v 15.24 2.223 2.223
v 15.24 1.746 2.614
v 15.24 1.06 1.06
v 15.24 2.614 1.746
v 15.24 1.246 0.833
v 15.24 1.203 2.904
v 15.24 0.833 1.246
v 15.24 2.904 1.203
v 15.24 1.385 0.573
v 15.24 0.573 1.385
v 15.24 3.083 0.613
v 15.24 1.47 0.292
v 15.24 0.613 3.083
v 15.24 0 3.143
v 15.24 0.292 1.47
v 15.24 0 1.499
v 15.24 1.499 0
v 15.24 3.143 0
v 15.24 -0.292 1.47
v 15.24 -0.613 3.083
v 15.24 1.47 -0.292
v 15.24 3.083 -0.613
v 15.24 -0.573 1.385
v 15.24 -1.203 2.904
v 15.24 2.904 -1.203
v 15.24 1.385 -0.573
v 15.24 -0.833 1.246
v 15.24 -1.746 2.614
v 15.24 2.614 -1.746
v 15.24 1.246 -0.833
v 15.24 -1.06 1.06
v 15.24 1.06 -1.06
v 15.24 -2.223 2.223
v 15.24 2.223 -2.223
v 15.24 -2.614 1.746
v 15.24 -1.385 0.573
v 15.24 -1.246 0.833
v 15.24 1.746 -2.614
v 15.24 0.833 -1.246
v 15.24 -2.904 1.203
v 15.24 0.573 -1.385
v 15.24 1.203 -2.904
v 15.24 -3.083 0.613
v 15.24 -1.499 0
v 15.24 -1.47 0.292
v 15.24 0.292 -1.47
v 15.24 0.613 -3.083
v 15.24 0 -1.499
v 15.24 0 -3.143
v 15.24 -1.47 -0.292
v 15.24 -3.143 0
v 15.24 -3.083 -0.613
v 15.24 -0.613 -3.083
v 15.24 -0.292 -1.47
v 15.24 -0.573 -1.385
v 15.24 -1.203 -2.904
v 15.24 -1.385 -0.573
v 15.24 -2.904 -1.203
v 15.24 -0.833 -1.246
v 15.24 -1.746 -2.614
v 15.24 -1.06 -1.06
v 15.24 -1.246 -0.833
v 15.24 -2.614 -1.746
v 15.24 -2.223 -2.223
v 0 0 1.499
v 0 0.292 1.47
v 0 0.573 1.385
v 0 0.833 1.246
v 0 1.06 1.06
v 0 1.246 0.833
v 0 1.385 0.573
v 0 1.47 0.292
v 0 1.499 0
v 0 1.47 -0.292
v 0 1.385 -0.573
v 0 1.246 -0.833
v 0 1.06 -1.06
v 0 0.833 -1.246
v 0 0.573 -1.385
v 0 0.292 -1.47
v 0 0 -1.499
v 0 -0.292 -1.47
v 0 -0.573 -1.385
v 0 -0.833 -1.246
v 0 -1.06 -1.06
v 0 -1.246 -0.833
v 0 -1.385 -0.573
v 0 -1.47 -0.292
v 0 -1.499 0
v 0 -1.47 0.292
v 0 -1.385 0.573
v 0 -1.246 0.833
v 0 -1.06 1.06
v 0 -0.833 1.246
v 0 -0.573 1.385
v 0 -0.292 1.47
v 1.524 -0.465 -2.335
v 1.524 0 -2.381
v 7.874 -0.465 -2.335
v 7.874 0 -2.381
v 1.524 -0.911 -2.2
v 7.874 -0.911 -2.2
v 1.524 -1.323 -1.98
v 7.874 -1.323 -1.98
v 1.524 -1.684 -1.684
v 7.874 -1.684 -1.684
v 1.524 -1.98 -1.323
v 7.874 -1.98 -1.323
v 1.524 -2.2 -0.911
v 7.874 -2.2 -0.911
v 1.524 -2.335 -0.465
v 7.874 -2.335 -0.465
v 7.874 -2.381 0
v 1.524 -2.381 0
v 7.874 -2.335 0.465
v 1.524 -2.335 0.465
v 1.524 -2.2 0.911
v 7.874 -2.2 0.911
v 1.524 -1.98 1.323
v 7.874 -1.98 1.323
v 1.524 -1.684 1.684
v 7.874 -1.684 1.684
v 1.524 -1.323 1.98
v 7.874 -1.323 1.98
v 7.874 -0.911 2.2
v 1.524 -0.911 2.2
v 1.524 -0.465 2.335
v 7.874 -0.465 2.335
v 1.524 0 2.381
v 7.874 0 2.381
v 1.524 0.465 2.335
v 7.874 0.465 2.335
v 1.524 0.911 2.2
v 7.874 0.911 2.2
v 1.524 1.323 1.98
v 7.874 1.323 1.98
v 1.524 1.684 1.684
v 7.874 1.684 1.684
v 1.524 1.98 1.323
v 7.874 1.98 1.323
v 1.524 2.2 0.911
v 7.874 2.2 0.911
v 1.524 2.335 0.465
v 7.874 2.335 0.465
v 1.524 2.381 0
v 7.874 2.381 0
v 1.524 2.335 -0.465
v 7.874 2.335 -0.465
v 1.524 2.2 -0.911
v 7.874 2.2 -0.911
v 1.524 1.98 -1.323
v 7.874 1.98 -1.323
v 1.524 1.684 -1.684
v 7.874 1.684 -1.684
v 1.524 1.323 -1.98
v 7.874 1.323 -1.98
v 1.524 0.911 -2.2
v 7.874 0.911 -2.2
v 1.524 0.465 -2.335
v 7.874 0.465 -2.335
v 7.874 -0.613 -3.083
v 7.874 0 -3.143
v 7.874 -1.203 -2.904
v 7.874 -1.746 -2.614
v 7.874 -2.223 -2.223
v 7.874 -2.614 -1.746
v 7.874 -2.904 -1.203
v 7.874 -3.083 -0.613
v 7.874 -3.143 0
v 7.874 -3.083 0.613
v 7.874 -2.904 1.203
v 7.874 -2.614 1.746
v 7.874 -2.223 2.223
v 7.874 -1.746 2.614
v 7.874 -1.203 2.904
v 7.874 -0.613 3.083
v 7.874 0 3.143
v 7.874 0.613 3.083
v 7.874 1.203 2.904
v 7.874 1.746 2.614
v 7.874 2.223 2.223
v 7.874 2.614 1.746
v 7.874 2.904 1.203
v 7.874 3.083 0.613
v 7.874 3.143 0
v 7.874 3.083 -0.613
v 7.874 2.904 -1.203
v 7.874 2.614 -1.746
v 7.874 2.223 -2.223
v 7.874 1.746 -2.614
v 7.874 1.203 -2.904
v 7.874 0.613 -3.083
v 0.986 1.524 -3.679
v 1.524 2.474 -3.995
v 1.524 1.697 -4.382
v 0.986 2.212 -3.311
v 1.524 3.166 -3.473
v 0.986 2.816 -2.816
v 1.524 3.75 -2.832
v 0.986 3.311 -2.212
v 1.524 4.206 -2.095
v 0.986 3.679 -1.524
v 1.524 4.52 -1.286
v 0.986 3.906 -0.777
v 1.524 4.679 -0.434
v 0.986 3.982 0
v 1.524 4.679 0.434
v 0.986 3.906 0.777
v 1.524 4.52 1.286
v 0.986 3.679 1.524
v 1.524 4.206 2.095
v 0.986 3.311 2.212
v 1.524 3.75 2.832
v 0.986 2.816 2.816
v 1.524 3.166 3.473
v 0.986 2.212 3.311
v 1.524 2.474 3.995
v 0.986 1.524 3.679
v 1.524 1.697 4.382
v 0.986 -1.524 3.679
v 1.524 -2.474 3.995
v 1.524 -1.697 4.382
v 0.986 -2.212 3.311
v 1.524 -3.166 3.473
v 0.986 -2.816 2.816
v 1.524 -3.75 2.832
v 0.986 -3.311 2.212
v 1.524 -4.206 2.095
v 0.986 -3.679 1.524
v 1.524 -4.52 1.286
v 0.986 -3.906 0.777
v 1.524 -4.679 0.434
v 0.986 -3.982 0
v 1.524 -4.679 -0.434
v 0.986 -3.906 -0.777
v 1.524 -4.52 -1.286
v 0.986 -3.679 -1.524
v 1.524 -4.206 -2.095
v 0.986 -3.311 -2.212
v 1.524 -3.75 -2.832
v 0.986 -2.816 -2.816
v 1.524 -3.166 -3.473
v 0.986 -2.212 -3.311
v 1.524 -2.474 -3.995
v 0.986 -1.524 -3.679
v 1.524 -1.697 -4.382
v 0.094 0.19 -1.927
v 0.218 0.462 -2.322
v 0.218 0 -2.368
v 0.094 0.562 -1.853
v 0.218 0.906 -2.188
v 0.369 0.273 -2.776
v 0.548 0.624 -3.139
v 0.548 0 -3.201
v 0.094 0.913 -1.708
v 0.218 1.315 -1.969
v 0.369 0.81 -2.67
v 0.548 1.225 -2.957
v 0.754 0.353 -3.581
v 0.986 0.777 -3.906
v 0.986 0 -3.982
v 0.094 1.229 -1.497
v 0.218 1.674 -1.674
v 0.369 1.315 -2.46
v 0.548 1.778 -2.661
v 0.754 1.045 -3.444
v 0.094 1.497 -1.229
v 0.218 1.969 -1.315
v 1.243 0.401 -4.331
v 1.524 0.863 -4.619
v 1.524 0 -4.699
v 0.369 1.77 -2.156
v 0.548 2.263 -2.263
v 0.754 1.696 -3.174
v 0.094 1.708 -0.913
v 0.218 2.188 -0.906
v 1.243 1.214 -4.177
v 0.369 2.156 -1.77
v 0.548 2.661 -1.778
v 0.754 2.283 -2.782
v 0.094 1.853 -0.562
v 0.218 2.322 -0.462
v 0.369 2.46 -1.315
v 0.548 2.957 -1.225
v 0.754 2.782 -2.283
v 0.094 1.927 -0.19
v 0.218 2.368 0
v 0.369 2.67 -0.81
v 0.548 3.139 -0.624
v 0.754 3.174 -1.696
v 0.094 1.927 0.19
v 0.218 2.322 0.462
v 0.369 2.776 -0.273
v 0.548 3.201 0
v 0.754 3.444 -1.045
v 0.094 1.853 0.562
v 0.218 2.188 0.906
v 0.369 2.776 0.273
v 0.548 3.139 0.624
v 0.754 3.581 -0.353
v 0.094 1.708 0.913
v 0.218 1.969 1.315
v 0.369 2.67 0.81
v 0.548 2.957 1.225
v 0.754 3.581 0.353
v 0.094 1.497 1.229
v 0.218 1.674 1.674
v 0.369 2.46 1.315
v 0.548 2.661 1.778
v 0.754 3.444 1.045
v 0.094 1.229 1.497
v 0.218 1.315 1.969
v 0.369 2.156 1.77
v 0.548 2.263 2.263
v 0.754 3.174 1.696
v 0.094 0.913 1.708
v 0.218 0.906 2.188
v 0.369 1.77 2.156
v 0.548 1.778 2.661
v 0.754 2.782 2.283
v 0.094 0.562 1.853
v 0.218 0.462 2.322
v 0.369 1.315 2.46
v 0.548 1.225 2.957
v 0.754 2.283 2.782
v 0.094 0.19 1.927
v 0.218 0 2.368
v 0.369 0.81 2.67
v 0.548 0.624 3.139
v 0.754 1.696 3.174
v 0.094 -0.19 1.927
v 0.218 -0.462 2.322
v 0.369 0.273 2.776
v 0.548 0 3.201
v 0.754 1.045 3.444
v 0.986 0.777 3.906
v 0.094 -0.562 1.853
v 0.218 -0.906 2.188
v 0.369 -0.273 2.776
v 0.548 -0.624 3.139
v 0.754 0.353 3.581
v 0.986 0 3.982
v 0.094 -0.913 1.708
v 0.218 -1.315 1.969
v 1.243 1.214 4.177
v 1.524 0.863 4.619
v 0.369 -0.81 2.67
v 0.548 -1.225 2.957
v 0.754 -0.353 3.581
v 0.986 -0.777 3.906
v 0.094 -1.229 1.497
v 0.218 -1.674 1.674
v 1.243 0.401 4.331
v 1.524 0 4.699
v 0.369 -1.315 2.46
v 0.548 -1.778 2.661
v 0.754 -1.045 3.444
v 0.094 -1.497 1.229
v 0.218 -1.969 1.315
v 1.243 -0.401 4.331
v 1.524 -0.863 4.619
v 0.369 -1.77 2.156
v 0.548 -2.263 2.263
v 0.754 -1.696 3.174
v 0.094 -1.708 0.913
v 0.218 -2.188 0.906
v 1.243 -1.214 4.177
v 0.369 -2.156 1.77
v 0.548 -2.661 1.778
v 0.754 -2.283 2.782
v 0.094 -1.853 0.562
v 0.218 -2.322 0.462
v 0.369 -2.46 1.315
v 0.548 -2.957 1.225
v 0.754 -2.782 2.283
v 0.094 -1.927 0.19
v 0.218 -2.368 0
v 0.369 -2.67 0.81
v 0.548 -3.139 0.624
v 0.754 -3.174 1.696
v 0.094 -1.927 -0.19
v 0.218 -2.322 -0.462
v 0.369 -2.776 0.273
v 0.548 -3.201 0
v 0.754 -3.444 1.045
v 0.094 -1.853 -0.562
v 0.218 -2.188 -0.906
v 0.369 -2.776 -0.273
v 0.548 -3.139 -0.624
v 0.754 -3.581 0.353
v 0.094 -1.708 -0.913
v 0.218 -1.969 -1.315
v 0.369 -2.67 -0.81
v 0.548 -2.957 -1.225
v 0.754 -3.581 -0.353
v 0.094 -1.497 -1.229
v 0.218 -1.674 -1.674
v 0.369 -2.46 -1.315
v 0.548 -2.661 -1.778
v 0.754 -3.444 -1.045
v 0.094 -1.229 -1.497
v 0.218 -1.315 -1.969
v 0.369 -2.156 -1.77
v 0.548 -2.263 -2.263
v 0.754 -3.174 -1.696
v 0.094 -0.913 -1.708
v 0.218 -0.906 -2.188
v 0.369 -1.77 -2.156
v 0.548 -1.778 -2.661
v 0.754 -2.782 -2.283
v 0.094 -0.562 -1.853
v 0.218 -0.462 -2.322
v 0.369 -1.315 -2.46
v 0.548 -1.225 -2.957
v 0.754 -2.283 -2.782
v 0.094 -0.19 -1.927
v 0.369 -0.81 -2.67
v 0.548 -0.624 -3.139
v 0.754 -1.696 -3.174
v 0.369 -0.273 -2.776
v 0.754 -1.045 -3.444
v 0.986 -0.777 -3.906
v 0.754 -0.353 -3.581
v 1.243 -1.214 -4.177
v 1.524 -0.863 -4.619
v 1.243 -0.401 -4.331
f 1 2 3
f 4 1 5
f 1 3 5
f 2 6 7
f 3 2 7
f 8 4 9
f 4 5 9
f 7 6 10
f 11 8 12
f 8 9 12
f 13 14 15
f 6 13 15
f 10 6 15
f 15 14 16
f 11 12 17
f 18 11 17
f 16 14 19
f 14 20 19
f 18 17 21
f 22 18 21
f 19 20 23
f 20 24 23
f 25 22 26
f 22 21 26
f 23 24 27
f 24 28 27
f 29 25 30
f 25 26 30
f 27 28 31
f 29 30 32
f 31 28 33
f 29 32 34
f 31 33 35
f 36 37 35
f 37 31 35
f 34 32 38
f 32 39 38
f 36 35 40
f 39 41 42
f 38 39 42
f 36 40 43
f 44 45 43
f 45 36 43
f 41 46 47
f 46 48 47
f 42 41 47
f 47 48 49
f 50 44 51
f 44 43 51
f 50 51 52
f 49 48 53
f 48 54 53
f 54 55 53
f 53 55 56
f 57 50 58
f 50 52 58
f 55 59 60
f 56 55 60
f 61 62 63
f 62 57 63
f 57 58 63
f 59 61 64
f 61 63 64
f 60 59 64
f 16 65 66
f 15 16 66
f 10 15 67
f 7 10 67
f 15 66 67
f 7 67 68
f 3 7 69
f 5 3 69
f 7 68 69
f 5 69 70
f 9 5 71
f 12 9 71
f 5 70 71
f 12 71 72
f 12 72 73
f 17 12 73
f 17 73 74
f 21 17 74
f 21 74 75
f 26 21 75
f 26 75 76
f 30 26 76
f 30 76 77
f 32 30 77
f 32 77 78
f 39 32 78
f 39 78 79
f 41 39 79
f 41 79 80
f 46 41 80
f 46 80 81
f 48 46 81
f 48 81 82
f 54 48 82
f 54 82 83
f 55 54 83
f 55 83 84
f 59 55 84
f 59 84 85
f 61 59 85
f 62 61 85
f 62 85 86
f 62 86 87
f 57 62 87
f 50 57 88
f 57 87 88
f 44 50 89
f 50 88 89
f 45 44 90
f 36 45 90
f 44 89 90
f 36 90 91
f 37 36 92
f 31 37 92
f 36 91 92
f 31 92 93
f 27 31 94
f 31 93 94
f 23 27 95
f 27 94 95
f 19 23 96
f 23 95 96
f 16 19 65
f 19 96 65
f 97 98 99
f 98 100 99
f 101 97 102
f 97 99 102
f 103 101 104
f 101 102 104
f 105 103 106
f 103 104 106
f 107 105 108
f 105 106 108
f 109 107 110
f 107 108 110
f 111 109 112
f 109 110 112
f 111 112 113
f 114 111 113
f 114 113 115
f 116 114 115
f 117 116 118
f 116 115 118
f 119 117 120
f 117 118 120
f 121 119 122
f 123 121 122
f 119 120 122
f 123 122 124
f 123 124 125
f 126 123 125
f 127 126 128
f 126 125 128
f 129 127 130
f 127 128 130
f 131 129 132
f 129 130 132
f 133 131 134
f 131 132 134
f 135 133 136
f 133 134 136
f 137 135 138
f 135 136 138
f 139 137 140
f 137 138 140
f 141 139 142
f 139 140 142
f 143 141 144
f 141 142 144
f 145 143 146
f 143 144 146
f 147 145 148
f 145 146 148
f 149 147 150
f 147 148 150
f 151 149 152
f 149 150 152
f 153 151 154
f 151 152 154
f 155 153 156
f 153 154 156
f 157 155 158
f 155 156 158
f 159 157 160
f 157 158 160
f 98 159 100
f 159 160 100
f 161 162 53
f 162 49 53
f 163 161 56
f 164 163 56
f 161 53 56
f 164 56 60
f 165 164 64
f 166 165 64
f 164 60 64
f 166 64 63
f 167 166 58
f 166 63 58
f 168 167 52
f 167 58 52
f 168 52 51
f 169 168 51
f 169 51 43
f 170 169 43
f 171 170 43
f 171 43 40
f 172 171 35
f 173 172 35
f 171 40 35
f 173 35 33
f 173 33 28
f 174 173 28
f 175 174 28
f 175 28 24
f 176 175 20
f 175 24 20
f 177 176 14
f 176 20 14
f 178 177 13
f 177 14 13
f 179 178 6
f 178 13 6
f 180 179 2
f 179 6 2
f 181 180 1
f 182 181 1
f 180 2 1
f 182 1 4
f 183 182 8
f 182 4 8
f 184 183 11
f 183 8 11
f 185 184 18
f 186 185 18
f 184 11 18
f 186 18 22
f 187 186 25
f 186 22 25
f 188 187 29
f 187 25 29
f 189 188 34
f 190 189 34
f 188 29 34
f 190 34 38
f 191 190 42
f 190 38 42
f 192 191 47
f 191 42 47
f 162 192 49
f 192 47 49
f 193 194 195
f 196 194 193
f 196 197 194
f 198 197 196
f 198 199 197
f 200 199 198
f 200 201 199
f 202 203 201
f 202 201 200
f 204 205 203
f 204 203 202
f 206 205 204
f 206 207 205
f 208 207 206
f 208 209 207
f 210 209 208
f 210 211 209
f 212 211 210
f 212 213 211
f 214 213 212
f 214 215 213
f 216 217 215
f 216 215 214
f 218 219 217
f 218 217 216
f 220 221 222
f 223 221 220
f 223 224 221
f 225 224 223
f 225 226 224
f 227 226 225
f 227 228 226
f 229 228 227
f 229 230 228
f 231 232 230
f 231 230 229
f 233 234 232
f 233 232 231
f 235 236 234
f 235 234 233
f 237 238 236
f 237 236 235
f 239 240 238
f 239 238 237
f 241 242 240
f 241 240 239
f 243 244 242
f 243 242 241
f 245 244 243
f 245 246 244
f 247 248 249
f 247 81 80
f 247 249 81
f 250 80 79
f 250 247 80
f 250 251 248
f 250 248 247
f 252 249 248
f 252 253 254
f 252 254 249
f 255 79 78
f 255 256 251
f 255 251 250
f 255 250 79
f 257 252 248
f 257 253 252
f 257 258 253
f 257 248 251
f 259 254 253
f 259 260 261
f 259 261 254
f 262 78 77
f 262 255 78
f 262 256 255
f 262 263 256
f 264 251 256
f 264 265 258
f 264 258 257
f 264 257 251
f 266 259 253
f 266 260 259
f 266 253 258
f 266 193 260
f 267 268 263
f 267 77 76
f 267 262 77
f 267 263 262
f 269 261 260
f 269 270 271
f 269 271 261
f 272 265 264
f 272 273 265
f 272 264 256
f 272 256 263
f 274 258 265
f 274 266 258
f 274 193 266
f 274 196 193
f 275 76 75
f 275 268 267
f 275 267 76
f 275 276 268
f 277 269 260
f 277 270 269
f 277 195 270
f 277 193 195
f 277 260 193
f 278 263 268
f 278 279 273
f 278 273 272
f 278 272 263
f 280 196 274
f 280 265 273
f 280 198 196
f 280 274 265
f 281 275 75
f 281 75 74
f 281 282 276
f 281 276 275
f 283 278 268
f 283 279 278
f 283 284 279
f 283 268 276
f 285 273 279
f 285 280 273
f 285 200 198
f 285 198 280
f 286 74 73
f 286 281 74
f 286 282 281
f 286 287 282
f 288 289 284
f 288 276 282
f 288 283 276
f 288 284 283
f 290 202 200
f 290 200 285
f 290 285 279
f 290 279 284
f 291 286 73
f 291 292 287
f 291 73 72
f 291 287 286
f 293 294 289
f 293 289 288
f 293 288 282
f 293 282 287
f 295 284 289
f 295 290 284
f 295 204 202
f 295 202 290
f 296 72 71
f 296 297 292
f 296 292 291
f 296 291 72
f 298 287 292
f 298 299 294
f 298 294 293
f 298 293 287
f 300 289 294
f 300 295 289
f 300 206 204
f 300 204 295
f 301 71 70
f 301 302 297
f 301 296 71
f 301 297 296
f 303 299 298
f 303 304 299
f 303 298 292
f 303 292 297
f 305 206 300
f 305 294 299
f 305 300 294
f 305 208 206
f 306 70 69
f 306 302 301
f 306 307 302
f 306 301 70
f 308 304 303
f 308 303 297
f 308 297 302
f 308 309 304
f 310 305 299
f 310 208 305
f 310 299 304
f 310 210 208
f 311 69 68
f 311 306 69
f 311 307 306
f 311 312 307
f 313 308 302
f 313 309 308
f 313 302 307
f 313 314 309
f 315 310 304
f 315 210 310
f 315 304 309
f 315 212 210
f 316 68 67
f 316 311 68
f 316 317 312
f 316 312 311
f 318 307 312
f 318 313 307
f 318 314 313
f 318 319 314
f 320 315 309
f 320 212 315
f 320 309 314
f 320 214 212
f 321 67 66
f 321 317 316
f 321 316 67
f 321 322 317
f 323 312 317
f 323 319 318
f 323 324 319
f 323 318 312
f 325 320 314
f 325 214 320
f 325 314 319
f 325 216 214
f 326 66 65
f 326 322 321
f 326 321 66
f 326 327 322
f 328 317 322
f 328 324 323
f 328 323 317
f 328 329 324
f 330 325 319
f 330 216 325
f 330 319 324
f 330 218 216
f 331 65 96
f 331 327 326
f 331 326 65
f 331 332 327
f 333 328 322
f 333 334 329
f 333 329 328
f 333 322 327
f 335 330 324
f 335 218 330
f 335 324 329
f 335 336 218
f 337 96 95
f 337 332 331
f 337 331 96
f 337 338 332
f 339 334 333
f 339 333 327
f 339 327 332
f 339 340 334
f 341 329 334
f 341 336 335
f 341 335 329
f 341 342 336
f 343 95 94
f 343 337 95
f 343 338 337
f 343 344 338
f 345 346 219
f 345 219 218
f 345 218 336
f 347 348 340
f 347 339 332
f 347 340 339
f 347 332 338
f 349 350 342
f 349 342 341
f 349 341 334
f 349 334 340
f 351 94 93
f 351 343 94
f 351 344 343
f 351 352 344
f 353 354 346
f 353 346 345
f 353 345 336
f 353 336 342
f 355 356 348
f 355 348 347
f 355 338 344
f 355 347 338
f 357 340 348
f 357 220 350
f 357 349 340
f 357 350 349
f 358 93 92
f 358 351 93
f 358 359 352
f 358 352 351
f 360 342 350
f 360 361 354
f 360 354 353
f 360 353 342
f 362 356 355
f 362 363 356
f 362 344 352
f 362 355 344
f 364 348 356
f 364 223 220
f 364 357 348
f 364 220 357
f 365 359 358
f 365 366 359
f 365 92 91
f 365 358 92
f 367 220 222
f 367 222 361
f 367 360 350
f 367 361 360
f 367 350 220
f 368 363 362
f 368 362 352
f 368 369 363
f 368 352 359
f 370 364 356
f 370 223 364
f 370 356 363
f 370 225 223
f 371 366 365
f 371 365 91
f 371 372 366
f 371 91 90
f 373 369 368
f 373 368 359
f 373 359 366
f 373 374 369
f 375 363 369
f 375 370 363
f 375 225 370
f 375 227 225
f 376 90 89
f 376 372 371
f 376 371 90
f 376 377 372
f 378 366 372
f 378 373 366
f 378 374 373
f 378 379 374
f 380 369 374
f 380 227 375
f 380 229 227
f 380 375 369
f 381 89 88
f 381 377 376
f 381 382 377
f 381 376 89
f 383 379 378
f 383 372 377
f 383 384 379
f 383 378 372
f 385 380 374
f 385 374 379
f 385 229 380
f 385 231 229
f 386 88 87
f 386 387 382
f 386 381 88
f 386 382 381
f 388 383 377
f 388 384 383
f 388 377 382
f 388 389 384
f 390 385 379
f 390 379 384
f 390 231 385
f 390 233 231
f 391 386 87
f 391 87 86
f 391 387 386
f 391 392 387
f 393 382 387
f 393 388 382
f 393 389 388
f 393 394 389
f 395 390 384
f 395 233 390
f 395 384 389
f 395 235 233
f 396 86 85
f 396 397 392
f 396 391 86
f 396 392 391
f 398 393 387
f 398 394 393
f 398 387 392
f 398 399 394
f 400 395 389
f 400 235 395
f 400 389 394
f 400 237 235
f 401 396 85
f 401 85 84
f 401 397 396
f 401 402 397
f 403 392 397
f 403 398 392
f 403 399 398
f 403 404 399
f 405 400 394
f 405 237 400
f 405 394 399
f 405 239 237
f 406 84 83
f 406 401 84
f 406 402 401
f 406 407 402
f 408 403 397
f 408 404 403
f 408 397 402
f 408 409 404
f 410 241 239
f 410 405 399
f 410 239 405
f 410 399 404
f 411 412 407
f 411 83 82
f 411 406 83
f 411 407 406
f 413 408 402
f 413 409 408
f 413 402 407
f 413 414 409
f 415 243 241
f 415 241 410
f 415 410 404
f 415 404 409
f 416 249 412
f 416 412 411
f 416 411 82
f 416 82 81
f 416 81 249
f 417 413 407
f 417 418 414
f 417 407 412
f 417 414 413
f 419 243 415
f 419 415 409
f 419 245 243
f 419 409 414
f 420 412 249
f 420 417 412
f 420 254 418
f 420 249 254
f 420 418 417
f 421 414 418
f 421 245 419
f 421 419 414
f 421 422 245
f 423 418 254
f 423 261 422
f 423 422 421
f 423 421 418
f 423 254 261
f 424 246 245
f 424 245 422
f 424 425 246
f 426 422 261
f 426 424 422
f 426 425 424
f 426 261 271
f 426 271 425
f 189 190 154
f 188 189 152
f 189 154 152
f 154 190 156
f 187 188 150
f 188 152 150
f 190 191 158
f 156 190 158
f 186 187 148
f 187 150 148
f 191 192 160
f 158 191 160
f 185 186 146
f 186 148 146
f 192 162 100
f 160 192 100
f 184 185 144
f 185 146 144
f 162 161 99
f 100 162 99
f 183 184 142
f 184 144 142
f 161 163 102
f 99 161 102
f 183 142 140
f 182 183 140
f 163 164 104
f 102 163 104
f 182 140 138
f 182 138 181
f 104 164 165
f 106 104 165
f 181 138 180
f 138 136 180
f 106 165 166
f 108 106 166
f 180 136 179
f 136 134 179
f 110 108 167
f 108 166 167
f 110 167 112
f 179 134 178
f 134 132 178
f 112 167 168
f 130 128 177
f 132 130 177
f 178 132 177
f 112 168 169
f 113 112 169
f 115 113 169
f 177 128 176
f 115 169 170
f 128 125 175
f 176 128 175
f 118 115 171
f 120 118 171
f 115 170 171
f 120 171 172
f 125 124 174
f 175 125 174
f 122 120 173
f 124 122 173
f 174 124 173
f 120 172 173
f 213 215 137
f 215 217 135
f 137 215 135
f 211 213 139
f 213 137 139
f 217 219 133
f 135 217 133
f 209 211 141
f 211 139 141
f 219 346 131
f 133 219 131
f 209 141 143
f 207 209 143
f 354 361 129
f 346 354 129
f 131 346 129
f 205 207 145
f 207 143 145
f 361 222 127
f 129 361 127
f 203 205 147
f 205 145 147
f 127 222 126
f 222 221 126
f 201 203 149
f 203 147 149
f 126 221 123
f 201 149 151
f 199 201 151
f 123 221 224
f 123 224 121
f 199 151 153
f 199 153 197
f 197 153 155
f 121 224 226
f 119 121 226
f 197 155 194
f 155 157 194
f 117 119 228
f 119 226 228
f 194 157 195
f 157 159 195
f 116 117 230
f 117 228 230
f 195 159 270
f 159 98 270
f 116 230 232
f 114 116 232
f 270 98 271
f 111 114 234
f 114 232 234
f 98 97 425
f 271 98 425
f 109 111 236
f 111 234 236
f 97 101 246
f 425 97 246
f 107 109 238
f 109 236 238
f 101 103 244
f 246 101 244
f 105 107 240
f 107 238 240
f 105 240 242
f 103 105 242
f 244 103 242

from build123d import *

# Parameters (mm, degrees)
SKETCH2_R         = 1.4986
CENTER_HOLE_DEPTH = 16.24


with BuildPart() as part:
    # Sketch1 → Revolve1 (revolve)
    with BuildSketch(Plane(origin=(0, 0, 0), x_dir=(1, 0, 0), z_dir=(0, 1, 0))):
        Polygon((0, 0), (0, 4.699), (1.524, 4.699), (1.524, 2.38125), (7.874, 2.38125), (7.874, 3.14325), (15.24, 3.14325), (15.24, 0), align=None)
    revolve(axis=Axis((15.24, 0, 0), (-1, 0, 0)))

    # Sketch2 → Center-Hole (cut, through all)
    with BuildSketch(Plane.ZY):
        Circle(SKETCH2_R)
    extrude(amount=-CENTER_HOLE_DEPTH, mode=Mode.SUBTRACT)

    # Sketch3 → Cut-Revolve1 (revolve, cut)
    with BuildSketch(Plane(origin=(0, 0, 0), x_dir=(1, 0, 0), z_dir=(0, 1, 0))):
        with BuildLine():
            Line((1.524, 4.699), (0, 4.699))
            Line((0, 4.699), (0, 1.4986))
            ThreePointArc((0, 1.4986), (0.548299529, 3.200562129), (1.524, 4.699))
        make_face()
    revolve(axis=Axis((0, 0, 0), (1, 0, 0)), mode=Mode.SUBTRACT)


solid = part.part
